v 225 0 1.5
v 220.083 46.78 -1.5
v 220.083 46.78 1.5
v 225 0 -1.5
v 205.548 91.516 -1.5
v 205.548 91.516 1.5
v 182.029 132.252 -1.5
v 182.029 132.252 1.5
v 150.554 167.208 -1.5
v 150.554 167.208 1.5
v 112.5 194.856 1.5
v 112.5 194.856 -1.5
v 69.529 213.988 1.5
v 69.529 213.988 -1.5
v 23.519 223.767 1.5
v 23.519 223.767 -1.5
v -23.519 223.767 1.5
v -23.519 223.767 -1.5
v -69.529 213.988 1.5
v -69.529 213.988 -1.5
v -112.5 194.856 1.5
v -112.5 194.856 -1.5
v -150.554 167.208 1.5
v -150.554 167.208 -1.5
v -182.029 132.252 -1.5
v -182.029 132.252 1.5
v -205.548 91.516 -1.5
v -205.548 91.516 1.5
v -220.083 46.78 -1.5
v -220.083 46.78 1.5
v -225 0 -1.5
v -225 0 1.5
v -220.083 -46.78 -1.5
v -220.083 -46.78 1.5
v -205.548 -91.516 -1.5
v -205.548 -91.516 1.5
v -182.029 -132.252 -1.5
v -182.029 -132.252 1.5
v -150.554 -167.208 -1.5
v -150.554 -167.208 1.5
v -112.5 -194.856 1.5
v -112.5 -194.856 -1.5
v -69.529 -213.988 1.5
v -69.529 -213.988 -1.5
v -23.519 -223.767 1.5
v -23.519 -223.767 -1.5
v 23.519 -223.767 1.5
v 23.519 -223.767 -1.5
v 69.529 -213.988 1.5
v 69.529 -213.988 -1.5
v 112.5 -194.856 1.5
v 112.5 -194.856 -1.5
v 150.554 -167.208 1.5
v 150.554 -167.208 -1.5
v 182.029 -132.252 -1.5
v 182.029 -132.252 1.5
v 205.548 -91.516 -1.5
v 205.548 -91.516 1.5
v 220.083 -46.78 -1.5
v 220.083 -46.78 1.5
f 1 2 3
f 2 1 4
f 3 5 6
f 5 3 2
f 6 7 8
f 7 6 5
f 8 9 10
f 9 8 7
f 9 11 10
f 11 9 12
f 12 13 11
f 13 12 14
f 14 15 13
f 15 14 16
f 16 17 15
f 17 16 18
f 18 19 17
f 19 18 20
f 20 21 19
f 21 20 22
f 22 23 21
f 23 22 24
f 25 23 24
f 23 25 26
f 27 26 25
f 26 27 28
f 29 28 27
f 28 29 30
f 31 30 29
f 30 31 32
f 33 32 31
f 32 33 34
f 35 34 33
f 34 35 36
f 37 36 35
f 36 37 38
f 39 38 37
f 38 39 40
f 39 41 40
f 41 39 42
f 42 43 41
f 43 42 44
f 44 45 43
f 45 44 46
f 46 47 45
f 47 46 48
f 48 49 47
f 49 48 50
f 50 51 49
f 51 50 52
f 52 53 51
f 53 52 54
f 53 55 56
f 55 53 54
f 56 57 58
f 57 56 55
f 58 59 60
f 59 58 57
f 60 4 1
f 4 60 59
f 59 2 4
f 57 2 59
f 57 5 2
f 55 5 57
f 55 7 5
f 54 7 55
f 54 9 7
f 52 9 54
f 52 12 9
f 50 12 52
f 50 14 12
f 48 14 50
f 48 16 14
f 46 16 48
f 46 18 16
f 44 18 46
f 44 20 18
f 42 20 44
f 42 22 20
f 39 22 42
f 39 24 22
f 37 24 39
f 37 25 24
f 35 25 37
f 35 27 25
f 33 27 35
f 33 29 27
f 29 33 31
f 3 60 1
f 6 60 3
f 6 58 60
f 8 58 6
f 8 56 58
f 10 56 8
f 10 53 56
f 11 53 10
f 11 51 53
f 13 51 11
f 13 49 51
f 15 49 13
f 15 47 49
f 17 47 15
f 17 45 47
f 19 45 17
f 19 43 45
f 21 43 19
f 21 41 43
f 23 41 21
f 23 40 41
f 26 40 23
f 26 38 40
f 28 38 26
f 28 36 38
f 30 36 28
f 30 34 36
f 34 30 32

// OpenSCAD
union() {
   cylinder(h = 3, d = 450, center = true);
scale([1, 1, .1])
  surface(file = "FC_St._Gallen_logo.png", center = true, invert = false);
  

}
